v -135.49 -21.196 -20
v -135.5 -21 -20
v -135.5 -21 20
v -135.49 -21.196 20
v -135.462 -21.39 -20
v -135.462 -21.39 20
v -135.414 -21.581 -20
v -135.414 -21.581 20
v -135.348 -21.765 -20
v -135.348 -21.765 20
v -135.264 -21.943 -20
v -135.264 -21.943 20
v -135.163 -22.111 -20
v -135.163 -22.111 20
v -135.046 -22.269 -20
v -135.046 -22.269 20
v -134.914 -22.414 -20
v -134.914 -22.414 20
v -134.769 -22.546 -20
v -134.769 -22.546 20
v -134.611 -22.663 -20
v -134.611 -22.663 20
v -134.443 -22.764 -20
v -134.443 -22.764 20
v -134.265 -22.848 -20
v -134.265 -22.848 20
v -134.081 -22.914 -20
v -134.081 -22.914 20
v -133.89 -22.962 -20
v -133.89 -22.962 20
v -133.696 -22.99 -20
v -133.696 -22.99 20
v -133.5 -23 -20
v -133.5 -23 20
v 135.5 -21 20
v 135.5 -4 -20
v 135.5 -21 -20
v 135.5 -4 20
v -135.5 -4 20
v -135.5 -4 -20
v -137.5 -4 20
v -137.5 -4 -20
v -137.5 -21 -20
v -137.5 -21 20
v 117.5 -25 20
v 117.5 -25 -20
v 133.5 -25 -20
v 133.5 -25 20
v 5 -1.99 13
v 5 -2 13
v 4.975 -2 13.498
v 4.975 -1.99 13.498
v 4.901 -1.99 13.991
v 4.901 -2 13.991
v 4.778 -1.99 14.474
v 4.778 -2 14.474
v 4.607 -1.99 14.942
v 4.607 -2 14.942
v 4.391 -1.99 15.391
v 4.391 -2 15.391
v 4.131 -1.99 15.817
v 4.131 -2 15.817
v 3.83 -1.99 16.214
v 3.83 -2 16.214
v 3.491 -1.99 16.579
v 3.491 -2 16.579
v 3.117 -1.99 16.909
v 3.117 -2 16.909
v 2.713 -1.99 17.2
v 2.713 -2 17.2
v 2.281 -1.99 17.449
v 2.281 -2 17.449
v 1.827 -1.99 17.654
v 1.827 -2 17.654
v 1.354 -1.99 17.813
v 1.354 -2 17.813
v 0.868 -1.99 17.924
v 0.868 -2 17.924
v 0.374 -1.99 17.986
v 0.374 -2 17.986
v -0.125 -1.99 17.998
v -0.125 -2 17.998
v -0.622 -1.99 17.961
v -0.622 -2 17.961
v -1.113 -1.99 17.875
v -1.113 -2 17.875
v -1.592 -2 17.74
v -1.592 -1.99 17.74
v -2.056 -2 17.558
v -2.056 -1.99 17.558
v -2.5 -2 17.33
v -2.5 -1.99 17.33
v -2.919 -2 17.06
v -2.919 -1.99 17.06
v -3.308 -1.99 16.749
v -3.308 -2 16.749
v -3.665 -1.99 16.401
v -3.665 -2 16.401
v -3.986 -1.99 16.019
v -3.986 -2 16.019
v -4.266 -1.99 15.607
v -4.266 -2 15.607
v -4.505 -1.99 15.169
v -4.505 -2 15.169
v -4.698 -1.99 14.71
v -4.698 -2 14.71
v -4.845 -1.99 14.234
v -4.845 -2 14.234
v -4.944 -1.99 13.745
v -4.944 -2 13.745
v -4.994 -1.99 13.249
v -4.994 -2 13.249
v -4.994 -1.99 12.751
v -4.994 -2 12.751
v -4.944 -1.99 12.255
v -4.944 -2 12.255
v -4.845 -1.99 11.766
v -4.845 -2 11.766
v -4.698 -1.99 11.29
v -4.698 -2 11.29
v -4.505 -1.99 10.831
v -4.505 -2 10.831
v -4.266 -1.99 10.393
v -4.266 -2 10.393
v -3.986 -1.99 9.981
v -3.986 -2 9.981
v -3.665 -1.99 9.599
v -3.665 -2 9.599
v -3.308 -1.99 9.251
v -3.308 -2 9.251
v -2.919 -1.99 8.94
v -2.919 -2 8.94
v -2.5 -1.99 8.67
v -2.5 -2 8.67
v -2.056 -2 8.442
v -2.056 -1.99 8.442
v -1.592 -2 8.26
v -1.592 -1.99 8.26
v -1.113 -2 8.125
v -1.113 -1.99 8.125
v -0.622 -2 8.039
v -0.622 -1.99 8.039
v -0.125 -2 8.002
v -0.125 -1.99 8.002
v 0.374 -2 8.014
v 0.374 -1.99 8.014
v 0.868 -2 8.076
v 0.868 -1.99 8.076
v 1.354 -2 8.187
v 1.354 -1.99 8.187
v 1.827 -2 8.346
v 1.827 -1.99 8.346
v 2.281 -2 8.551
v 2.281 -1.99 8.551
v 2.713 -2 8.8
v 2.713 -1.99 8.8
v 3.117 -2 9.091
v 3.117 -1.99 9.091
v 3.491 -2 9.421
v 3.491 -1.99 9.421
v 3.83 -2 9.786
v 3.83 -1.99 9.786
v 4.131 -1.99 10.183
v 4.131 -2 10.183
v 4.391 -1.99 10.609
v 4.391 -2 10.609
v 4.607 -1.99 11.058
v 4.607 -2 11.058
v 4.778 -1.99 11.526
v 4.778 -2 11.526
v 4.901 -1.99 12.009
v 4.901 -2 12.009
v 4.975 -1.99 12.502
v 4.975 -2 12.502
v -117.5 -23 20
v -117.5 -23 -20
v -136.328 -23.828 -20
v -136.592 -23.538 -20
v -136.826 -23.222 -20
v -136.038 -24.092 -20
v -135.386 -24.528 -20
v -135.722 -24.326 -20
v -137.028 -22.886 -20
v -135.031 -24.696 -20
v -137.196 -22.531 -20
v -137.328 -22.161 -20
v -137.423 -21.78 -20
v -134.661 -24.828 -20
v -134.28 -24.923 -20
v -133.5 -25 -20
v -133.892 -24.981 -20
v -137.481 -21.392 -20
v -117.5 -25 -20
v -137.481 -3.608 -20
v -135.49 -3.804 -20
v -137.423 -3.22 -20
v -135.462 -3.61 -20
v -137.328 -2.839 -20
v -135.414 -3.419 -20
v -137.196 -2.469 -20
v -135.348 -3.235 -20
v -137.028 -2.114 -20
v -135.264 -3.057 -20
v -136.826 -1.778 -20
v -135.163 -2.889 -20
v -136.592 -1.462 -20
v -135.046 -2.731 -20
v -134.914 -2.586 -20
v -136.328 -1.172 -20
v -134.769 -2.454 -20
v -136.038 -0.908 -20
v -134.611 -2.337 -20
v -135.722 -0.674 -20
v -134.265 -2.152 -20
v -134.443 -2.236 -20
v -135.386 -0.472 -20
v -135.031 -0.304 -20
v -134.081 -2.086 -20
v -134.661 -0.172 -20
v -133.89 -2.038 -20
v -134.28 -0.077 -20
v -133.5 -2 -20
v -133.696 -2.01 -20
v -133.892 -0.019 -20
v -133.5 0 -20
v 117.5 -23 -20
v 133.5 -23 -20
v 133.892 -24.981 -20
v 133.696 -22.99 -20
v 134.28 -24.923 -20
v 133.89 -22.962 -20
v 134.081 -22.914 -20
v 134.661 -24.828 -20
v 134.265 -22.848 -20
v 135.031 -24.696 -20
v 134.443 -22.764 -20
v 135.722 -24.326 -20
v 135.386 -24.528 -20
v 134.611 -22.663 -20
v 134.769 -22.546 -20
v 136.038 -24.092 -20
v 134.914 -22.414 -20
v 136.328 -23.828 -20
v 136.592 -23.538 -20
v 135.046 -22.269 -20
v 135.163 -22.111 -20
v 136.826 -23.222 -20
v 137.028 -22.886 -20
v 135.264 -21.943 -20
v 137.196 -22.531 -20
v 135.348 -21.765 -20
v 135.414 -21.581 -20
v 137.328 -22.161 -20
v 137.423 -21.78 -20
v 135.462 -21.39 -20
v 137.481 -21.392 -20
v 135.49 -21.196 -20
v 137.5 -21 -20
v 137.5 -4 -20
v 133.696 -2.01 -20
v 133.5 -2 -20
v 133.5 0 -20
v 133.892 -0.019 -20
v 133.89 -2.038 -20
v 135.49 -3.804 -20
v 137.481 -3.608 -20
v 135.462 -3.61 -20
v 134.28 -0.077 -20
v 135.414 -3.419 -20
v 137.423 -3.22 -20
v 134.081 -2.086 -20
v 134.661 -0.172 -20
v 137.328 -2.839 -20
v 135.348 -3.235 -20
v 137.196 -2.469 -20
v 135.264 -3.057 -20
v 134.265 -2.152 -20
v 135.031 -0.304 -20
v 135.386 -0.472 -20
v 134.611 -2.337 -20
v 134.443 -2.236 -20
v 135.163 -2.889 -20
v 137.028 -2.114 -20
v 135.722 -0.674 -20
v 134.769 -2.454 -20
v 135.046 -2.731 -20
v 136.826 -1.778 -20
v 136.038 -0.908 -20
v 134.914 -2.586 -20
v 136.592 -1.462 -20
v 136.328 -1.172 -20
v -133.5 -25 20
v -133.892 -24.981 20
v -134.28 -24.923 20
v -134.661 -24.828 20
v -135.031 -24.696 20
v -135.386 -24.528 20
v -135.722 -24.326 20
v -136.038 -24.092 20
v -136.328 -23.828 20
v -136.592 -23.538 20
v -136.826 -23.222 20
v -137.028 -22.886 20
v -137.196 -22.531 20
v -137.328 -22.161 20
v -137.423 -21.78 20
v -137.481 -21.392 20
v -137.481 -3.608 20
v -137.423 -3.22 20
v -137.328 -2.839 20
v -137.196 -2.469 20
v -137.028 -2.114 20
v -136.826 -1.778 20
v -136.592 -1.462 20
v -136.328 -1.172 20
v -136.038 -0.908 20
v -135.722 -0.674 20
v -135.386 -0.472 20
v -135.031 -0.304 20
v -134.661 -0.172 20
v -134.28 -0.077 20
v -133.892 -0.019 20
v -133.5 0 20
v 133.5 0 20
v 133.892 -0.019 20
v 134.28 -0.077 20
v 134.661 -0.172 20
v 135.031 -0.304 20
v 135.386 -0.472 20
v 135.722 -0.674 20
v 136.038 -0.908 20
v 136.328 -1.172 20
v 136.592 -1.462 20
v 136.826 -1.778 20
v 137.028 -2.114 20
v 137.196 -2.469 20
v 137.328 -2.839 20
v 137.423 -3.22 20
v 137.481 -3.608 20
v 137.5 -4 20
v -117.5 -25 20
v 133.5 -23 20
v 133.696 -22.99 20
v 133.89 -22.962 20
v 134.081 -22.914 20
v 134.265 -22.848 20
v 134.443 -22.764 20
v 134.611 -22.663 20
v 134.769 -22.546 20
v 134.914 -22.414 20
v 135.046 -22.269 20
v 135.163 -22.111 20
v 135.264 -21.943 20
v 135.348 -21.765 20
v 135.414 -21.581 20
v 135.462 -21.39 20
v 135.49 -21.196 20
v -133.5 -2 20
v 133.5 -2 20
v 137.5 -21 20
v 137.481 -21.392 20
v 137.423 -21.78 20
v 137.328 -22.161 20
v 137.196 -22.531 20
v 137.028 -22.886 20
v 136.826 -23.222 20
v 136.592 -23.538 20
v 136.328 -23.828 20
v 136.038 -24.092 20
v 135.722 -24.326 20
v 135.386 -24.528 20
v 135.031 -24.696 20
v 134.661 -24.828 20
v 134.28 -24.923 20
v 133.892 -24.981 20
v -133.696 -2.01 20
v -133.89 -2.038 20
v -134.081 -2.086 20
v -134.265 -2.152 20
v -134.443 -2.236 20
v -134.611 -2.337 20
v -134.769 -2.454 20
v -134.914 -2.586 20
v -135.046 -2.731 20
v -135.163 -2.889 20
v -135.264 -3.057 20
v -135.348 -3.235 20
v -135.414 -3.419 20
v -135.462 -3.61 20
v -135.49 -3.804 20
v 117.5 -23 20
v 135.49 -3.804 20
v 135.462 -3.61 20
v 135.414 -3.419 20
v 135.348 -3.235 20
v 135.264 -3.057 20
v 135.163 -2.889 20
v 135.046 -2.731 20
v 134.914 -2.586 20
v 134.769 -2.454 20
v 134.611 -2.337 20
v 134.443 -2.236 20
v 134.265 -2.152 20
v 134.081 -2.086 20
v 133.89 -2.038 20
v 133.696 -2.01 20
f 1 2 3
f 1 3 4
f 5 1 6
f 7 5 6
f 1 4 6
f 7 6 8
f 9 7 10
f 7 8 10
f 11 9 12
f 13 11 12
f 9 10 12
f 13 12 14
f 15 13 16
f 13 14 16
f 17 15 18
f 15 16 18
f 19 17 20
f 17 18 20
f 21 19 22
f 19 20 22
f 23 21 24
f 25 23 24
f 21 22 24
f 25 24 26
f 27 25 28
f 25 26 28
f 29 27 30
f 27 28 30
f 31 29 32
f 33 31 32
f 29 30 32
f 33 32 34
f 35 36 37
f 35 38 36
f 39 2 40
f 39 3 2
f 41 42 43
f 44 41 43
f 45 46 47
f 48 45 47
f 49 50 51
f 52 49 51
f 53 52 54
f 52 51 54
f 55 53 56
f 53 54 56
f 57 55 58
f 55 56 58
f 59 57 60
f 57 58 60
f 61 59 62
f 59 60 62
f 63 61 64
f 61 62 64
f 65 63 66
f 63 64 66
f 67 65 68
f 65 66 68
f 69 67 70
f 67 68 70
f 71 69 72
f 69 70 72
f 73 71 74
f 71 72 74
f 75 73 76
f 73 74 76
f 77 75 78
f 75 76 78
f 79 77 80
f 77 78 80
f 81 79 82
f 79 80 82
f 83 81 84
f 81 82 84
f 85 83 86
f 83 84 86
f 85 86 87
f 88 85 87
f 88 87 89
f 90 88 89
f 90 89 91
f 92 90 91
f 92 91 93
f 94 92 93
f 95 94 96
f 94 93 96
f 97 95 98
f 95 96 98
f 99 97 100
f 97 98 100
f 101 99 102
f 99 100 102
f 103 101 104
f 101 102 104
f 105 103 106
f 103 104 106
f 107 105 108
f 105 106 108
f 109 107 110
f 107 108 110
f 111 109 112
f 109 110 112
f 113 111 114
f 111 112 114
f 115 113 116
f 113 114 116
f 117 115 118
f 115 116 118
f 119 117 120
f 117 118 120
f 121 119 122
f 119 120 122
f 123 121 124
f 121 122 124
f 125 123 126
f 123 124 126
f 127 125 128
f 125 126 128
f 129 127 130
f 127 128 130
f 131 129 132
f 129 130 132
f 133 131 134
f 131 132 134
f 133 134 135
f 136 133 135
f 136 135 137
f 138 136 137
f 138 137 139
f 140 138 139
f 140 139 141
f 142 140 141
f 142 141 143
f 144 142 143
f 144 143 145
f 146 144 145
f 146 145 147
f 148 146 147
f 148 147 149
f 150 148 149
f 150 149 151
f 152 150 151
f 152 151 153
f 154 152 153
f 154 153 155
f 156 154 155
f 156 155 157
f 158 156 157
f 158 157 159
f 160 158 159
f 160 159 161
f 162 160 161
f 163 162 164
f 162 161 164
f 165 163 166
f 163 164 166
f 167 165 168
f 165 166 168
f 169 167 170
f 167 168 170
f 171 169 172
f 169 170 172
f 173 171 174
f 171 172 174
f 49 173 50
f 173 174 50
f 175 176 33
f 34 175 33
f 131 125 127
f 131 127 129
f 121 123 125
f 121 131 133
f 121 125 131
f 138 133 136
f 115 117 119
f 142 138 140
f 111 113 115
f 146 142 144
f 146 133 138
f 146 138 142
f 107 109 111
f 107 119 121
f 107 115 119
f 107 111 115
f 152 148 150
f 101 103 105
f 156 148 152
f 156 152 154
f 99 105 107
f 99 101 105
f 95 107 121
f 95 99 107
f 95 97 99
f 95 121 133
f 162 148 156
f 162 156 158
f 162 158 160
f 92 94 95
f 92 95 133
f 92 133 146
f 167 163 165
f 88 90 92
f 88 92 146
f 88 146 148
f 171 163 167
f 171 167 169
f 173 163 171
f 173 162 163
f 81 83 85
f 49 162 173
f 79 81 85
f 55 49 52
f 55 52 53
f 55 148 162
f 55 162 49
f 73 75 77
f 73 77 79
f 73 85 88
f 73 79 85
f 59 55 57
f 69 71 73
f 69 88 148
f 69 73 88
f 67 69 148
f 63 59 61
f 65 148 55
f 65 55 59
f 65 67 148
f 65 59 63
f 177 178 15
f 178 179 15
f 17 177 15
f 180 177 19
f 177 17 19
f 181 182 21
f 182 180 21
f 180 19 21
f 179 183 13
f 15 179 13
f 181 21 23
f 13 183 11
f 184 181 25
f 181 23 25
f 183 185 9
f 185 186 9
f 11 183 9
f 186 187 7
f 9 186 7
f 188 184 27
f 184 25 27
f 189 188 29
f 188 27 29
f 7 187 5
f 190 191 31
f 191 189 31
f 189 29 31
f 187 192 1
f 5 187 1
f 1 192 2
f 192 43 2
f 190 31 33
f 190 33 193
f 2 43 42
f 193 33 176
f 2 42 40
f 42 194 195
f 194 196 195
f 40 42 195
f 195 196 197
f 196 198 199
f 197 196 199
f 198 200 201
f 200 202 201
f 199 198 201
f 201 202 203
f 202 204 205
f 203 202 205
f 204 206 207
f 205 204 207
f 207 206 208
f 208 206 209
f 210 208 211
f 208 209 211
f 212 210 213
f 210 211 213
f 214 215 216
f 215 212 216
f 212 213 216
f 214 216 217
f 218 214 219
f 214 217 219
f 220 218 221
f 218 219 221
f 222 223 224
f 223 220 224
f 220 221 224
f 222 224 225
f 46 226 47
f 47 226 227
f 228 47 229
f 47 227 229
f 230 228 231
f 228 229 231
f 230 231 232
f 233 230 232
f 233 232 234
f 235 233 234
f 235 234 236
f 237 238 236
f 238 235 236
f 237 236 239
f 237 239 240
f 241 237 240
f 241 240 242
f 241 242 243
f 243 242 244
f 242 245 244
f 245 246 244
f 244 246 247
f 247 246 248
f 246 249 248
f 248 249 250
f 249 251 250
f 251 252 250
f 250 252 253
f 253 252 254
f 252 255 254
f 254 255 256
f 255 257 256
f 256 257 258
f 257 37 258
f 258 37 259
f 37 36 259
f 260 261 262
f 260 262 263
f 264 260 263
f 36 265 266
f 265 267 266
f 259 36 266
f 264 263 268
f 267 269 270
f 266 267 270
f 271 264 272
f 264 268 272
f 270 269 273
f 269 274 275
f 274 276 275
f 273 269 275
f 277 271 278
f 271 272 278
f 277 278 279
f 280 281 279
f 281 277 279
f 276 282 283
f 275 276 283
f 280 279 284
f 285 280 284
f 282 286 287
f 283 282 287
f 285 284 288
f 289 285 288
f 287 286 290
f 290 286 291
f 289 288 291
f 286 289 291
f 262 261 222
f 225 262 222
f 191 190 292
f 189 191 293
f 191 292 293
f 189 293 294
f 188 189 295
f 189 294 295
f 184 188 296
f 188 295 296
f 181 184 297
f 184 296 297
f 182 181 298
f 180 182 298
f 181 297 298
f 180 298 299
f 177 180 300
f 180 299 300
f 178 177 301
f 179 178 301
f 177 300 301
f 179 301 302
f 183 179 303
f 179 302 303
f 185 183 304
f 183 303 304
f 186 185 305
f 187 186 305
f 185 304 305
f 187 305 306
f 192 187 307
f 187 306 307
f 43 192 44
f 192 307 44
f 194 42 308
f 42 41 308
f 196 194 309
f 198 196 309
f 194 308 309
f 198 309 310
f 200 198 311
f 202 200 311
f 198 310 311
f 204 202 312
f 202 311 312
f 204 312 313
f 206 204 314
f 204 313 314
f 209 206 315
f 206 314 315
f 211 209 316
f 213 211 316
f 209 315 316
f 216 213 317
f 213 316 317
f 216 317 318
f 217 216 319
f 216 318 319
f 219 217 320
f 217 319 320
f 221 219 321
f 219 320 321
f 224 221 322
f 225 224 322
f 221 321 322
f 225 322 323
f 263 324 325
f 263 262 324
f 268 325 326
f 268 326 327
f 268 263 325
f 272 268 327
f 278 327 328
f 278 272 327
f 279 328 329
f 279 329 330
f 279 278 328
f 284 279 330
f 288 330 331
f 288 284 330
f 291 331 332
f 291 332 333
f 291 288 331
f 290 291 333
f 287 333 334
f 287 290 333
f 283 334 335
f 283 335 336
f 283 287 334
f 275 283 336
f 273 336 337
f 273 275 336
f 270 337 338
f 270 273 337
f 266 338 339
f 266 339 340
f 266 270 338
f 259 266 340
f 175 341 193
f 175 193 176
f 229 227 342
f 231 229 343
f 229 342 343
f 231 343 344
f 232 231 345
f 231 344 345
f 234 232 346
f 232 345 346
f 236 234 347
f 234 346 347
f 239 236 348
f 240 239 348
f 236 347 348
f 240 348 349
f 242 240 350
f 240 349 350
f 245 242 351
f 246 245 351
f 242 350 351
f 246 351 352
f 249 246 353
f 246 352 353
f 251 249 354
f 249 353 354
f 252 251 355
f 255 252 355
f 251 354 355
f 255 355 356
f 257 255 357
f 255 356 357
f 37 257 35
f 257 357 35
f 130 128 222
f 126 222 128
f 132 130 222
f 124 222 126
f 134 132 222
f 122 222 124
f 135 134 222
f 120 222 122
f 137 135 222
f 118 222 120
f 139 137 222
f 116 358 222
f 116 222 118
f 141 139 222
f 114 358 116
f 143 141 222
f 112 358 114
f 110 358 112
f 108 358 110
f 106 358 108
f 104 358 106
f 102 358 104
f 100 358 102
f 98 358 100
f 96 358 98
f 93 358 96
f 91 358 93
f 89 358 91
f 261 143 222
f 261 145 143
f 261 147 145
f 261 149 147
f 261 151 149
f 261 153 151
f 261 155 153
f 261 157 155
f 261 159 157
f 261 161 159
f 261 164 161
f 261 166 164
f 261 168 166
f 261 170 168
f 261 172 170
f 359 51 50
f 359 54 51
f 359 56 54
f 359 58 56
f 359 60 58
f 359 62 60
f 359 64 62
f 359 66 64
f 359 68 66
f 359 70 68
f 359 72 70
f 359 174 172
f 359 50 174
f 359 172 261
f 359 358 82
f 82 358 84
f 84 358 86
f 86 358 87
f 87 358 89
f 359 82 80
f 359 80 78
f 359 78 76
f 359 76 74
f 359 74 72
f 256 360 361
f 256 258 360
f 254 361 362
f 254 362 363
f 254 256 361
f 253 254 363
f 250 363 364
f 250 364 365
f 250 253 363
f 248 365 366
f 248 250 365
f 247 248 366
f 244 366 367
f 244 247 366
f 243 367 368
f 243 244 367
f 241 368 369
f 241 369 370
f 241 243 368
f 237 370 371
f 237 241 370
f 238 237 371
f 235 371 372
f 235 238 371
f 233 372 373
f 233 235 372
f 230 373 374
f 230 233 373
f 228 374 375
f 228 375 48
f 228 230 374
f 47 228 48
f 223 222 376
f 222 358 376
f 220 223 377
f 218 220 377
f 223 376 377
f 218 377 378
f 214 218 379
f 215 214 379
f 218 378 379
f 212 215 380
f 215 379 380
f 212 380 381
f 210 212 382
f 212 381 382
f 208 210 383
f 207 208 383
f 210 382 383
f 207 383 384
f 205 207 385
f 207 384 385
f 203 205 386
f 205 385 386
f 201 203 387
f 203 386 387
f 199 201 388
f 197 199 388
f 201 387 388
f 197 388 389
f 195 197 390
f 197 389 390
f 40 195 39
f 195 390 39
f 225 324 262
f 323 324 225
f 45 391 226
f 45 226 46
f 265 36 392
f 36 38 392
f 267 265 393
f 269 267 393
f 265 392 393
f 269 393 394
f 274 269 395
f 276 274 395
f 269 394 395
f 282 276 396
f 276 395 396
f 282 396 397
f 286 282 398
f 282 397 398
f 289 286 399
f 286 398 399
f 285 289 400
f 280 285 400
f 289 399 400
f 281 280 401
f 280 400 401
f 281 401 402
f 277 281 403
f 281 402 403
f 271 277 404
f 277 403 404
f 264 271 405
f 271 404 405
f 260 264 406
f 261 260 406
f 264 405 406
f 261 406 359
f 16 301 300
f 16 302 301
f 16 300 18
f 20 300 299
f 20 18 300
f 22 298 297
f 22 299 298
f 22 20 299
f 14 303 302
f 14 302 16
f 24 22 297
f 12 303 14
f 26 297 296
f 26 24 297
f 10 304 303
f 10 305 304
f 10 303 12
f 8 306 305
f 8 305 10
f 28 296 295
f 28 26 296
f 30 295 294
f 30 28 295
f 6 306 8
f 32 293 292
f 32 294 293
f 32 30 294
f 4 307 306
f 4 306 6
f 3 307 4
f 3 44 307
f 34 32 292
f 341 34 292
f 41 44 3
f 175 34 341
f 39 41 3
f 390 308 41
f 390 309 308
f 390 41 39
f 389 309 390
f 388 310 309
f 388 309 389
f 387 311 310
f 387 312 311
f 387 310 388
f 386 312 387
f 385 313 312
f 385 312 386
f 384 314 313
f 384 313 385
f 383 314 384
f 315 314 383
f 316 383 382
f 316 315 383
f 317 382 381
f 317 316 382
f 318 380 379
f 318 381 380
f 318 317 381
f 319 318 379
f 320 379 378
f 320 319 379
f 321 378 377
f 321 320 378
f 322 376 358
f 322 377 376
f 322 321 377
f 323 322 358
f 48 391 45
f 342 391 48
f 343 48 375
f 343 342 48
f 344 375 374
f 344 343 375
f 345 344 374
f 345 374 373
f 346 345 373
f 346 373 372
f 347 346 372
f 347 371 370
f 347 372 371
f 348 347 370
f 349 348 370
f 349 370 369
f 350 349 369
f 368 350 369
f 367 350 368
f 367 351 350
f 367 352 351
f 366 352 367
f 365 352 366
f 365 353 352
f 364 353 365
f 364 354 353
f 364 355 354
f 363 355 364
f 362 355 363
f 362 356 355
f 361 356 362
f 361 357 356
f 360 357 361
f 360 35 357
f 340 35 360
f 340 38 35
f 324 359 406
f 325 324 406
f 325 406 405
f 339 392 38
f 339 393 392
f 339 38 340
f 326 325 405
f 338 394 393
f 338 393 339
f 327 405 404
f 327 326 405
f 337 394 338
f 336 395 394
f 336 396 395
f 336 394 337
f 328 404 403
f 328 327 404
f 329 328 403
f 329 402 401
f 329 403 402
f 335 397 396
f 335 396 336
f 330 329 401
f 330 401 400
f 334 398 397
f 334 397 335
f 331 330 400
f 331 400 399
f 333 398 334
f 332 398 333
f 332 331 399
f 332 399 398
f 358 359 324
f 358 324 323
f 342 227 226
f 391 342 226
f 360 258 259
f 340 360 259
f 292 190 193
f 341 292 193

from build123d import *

# Parameters (mm, degrees)
F1_DEPTH = 20
F2_R     = 2
F3_R     = 4
F4_R     = 5
F5_DEPTH = 0.01


with BuildPart() as f1:
    # F0 (on Top) → F1 (new body, symmetric)
    with BuildSketch(Plane.XY):
        Polygon((137.5, 0), (0, 0), (-137.5, 0), (-137.5, -25), (-117.5, -25), (-117.5, -23), (-135.5, -23), (-135.5, -2), (0, -2), (135.5, -2), (135.5, -23), (117.5, -23), (117.5, -25), (137.5, -25), align=None)
    extrude(amount=F1_DEPTH, both=True)

    # F2
    f2_edges = [f1.edges().sort_by_distance(p)[0] for p in [
        (-135.5, -23, 0),
        (-135.5, -2, 0),
        (135.5, -23, 0),
        (135.5, -2, 0),
    ]]
    fillet(f2_edges, radius=F2_R)

    # F3
    f3_edges = [f1.edges().sort_by_distance(p)[0] for p in [
        (-137.5, -25, 0),
        (-137.5, 0, 0),
        (137.5, -25, 0),
        (137.5, 0, 0),
    ]]
    fillet(f3_edges, radius=F3_R)

    # F4 (on face) → F5 (cut)
    with BuildSketch(Plane.XZ.offset(2)):
        with Locations((0, 13)):
            Circle(F4_R)
    extrude(amount=-F5_DEPTH, mode=Mode.SUBTRACT)


solid = f1.part
